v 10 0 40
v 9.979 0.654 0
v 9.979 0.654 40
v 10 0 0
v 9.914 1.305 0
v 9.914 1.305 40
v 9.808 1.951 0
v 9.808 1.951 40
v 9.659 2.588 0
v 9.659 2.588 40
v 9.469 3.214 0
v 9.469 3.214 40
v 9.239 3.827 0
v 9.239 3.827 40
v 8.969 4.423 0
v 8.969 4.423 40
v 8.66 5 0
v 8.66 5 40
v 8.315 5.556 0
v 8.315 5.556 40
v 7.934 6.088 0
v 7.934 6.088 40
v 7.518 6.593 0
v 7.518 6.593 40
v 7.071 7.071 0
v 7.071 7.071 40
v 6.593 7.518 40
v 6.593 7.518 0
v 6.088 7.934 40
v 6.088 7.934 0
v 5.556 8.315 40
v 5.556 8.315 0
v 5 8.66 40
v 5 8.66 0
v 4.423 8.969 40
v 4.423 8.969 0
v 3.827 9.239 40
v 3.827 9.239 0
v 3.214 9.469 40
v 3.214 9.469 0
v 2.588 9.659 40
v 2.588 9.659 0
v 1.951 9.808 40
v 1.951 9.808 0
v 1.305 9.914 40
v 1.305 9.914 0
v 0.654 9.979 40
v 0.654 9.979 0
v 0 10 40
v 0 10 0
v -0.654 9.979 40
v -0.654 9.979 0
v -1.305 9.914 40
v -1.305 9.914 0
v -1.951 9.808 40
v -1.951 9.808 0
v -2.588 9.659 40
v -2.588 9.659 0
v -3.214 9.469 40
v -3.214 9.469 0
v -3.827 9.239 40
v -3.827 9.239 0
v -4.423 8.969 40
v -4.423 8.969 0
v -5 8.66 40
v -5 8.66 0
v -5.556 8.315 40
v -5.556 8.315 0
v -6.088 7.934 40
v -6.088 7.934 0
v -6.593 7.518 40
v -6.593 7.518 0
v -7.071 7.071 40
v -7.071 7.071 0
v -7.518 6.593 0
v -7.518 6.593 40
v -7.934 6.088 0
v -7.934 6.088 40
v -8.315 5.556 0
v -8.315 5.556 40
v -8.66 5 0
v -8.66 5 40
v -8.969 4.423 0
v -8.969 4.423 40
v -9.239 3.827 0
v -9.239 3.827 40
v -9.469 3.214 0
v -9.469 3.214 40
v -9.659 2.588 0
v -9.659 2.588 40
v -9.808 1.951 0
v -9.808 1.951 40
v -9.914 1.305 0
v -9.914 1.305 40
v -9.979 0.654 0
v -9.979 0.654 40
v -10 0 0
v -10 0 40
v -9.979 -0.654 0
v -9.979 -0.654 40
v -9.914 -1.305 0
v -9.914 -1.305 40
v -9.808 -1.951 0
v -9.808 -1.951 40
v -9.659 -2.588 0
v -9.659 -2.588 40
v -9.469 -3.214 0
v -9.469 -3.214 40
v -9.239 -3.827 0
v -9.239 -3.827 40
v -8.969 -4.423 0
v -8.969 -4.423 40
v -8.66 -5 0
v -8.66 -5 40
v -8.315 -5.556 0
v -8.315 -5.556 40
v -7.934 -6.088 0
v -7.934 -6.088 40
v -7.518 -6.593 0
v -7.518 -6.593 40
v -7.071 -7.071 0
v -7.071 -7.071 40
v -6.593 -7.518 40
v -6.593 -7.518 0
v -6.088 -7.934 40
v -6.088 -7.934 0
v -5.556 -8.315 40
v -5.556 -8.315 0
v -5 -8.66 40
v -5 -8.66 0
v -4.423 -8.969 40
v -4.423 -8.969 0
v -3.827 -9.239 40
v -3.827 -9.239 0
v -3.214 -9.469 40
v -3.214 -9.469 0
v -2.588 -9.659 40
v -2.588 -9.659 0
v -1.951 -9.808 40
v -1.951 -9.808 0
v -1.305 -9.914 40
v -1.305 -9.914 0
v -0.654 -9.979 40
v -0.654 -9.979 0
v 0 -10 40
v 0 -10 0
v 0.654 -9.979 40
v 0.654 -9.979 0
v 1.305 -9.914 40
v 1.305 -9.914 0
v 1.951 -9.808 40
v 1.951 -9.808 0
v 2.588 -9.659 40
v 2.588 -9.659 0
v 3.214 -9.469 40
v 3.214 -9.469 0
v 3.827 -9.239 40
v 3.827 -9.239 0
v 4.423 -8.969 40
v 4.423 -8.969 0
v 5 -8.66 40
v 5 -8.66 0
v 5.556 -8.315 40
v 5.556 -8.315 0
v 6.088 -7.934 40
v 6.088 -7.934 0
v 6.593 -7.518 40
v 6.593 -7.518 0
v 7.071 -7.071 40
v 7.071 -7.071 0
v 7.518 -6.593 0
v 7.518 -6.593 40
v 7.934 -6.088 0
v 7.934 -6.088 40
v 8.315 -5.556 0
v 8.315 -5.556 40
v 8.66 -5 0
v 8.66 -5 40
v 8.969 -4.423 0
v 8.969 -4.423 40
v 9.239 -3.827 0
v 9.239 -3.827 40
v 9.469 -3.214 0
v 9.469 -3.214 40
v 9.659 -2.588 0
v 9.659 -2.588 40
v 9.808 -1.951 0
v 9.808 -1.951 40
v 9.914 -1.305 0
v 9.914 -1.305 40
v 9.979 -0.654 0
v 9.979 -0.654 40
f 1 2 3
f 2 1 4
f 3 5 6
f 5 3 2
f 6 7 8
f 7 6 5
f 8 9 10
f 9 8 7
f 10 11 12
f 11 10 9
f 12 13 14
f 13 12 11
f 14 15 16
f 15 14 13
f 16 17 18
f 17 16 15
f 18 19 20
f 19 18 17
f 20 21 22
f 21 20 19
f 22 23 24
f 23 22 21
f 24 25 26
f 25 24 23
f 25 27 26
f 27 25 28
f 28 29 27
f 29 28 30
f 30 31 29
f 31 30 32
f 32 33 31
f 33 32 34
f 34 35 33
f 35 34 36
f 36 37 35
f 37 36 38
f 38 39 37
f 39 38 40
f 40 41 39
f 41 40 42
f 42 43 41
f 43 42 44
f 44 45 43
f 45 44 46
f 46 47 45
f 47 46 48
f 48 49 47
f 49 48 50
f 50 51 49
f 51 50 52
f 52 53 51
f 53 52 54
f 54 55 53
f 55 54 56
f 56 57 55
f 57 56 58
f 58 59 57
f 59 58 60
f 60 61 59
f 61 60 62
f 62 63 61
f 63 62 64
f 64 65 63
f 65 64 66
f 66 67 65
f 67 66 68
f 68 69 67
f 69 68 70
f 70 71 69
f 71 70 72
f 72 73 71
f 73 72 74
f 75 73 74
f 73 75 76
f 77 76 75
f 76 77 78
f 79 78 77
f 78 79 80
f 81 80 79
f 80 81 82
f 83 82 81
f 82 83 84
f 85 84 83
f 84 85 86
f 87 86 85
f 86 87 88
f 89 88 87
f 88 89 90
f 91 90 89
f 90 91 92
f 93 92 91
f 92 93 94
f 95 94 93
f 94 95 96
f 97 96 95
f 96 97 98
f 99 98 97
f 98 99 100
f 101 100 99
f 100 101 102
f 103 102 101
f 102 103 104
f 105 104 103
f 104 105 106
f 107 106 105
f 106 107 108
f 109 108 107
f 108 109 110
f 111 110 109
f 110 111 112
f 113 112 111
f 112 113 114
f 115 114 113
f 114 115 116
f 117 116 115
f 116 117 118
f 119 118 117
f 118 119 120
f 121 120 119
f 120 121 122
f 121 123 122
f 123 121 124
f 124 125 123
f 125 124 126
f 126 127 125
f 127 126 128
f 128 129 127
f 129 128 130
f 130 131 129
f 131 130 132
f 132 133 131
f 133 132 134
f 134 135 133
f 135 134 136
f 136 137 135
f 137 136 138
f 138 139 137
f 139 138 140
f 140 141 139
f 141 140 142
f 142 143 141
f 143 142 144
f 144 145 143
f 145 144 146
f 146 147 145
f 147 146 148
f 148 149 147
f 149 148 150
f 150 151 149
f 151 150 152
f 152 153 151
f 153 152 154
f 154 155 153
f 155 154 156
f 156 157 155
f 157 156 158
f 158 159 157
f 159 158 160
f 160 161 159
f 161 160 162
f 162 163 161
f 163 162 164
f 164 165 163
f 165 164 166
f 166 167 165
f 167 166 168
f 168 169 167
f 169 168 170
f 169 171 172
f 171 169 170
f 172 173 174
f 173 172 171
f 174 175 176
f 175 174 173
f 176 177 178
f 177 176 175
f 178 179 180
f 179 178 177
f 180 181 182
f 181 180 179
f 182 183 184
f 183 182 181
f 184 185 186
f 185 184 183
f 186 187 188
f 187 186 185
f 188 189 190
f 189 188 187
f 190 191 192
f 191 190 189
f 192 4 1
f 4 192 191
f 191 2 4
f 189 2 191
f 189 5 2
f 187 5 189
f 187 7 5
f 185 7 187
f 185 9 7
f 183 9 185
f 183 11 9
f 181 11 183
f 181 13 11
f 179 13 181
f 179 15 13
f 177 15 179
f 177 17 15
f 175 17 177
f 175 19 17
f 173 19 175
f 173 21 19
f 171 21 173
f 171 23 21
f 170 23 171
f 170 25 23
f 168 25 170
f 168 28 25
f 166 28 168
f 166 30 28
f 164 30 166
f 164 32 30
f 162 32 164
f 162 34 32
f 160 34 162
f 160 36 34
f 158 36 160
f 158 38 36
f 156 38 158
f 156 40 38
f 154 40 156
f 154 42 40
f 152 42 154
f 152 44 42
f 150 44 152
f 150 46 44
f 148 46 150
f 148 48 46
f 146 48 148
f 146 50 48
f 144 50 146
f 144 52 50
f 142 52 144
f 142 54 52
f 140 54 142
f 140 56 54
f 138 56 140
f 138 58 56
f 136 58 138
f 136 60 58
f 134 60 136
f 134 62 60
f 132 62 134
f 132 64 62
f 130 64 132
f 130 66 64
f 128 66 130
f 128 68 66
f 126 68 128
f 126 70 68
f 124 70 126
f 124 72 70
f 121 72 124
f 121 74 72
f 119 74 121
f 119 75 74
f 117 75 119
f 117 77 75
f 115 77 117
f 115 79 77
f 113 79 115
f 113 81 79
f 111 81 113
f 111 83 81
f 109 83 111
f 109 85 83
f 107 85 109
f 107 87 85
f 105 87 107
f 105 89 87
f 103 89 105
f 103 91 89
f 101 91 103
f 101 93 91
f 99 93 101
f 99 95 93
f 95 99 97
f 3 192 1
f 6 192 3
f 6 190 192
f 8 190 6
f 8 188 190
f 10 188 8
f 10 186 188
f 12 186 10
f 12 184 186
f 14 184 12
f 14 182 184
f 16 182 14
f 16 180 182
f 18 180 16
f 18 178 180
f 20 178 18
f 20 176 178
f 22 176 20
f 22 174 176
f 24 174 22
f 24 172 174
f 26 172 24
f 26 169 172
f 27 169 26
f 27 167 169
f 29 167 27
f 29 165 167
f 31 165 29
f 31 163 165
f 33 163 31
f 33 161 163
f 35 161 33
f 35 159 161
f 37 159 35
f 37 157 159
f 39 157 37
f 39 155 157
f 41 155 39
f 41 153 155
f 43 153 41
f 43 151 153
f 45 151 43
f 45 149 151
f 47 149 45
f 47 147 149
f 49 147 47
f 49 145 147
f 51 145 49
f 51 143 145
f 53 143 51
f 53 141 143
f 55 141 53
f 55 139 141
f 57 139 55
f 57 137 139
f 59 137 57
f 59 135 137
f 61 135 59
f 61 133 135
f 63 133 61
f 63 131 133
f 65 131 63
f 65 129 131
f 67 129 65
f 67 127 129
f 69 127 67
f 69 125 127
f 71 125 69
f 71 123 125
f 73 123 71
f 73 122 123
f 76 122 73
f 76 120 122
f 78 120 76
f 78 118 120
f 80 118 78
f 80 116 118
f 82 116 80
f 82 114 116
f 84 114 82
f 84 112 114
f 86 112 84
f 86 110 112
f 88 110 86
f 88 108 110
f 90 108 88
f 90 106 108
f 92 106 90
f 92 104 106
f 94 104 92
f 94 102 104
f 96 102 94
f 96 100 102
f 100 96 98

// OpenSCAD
// ============================================
// ROBUST CYLINDER / TUBE (with cutter mode)
// ============================================
// Notes:
// - Use as_cutter=true when subtracting (difference()) to avoid coplanar z-faces.
// - For tubes (inner_diam>0), inner subtraction also overshoots.
// - Increase overshoot to 0.5 if your preview still flickers; F6 render is exact.
//
// param: diam=20, height=40, center=false, inner_diam=0, as_cutter=false, overshoot=0.3, $fn_shape=96
// CALL:
cyl_shape(diam=20, height=40, center=false, inner_diam=0, as_cutter=false, overshoot=0.3, $fn_shape=96);

module cyl_shape(diam=20, height=40, center=false,
                 inner_diam=0, as_cutter=false,
                 overshoot=0.3, $fn_shape=96)
{
    $fn = $fn_shape;

    // Determine final height and z-shift when overshooting
    extra_h = as_cutter ? (height + 2*overshoot) : height;
    z_shift = 0;
    if (as_cutter) {
        // Overshoot both ends to avoid coplanar faces with the host solid
        z_shift = center ? 0 : -overshoot;
    }

    // Solid cylinder (no inner bore)
    if (inner_diam <= 0) {
        translate([0,0,z_shift])
            cylinder(h = extra_h, d = diam, center = center);
    }
    // Tube: subtract an over-length inner cylinder
    else {
        difference() {
            translate([0,0,z_shift])
                cylinder(h = extra_h, d = diam, center = center);

            // Inner subtraction: always over-length to avoid coplanarity inside
            inner_extra_h = height + 2*overshoot;
            inner_shift   = center ? 0 : -overshoot;
            translate([0,0,inner_shift])
                cylinder(h = inner_extra_h, d = inner_diam, center = center);
        }
    }
}
